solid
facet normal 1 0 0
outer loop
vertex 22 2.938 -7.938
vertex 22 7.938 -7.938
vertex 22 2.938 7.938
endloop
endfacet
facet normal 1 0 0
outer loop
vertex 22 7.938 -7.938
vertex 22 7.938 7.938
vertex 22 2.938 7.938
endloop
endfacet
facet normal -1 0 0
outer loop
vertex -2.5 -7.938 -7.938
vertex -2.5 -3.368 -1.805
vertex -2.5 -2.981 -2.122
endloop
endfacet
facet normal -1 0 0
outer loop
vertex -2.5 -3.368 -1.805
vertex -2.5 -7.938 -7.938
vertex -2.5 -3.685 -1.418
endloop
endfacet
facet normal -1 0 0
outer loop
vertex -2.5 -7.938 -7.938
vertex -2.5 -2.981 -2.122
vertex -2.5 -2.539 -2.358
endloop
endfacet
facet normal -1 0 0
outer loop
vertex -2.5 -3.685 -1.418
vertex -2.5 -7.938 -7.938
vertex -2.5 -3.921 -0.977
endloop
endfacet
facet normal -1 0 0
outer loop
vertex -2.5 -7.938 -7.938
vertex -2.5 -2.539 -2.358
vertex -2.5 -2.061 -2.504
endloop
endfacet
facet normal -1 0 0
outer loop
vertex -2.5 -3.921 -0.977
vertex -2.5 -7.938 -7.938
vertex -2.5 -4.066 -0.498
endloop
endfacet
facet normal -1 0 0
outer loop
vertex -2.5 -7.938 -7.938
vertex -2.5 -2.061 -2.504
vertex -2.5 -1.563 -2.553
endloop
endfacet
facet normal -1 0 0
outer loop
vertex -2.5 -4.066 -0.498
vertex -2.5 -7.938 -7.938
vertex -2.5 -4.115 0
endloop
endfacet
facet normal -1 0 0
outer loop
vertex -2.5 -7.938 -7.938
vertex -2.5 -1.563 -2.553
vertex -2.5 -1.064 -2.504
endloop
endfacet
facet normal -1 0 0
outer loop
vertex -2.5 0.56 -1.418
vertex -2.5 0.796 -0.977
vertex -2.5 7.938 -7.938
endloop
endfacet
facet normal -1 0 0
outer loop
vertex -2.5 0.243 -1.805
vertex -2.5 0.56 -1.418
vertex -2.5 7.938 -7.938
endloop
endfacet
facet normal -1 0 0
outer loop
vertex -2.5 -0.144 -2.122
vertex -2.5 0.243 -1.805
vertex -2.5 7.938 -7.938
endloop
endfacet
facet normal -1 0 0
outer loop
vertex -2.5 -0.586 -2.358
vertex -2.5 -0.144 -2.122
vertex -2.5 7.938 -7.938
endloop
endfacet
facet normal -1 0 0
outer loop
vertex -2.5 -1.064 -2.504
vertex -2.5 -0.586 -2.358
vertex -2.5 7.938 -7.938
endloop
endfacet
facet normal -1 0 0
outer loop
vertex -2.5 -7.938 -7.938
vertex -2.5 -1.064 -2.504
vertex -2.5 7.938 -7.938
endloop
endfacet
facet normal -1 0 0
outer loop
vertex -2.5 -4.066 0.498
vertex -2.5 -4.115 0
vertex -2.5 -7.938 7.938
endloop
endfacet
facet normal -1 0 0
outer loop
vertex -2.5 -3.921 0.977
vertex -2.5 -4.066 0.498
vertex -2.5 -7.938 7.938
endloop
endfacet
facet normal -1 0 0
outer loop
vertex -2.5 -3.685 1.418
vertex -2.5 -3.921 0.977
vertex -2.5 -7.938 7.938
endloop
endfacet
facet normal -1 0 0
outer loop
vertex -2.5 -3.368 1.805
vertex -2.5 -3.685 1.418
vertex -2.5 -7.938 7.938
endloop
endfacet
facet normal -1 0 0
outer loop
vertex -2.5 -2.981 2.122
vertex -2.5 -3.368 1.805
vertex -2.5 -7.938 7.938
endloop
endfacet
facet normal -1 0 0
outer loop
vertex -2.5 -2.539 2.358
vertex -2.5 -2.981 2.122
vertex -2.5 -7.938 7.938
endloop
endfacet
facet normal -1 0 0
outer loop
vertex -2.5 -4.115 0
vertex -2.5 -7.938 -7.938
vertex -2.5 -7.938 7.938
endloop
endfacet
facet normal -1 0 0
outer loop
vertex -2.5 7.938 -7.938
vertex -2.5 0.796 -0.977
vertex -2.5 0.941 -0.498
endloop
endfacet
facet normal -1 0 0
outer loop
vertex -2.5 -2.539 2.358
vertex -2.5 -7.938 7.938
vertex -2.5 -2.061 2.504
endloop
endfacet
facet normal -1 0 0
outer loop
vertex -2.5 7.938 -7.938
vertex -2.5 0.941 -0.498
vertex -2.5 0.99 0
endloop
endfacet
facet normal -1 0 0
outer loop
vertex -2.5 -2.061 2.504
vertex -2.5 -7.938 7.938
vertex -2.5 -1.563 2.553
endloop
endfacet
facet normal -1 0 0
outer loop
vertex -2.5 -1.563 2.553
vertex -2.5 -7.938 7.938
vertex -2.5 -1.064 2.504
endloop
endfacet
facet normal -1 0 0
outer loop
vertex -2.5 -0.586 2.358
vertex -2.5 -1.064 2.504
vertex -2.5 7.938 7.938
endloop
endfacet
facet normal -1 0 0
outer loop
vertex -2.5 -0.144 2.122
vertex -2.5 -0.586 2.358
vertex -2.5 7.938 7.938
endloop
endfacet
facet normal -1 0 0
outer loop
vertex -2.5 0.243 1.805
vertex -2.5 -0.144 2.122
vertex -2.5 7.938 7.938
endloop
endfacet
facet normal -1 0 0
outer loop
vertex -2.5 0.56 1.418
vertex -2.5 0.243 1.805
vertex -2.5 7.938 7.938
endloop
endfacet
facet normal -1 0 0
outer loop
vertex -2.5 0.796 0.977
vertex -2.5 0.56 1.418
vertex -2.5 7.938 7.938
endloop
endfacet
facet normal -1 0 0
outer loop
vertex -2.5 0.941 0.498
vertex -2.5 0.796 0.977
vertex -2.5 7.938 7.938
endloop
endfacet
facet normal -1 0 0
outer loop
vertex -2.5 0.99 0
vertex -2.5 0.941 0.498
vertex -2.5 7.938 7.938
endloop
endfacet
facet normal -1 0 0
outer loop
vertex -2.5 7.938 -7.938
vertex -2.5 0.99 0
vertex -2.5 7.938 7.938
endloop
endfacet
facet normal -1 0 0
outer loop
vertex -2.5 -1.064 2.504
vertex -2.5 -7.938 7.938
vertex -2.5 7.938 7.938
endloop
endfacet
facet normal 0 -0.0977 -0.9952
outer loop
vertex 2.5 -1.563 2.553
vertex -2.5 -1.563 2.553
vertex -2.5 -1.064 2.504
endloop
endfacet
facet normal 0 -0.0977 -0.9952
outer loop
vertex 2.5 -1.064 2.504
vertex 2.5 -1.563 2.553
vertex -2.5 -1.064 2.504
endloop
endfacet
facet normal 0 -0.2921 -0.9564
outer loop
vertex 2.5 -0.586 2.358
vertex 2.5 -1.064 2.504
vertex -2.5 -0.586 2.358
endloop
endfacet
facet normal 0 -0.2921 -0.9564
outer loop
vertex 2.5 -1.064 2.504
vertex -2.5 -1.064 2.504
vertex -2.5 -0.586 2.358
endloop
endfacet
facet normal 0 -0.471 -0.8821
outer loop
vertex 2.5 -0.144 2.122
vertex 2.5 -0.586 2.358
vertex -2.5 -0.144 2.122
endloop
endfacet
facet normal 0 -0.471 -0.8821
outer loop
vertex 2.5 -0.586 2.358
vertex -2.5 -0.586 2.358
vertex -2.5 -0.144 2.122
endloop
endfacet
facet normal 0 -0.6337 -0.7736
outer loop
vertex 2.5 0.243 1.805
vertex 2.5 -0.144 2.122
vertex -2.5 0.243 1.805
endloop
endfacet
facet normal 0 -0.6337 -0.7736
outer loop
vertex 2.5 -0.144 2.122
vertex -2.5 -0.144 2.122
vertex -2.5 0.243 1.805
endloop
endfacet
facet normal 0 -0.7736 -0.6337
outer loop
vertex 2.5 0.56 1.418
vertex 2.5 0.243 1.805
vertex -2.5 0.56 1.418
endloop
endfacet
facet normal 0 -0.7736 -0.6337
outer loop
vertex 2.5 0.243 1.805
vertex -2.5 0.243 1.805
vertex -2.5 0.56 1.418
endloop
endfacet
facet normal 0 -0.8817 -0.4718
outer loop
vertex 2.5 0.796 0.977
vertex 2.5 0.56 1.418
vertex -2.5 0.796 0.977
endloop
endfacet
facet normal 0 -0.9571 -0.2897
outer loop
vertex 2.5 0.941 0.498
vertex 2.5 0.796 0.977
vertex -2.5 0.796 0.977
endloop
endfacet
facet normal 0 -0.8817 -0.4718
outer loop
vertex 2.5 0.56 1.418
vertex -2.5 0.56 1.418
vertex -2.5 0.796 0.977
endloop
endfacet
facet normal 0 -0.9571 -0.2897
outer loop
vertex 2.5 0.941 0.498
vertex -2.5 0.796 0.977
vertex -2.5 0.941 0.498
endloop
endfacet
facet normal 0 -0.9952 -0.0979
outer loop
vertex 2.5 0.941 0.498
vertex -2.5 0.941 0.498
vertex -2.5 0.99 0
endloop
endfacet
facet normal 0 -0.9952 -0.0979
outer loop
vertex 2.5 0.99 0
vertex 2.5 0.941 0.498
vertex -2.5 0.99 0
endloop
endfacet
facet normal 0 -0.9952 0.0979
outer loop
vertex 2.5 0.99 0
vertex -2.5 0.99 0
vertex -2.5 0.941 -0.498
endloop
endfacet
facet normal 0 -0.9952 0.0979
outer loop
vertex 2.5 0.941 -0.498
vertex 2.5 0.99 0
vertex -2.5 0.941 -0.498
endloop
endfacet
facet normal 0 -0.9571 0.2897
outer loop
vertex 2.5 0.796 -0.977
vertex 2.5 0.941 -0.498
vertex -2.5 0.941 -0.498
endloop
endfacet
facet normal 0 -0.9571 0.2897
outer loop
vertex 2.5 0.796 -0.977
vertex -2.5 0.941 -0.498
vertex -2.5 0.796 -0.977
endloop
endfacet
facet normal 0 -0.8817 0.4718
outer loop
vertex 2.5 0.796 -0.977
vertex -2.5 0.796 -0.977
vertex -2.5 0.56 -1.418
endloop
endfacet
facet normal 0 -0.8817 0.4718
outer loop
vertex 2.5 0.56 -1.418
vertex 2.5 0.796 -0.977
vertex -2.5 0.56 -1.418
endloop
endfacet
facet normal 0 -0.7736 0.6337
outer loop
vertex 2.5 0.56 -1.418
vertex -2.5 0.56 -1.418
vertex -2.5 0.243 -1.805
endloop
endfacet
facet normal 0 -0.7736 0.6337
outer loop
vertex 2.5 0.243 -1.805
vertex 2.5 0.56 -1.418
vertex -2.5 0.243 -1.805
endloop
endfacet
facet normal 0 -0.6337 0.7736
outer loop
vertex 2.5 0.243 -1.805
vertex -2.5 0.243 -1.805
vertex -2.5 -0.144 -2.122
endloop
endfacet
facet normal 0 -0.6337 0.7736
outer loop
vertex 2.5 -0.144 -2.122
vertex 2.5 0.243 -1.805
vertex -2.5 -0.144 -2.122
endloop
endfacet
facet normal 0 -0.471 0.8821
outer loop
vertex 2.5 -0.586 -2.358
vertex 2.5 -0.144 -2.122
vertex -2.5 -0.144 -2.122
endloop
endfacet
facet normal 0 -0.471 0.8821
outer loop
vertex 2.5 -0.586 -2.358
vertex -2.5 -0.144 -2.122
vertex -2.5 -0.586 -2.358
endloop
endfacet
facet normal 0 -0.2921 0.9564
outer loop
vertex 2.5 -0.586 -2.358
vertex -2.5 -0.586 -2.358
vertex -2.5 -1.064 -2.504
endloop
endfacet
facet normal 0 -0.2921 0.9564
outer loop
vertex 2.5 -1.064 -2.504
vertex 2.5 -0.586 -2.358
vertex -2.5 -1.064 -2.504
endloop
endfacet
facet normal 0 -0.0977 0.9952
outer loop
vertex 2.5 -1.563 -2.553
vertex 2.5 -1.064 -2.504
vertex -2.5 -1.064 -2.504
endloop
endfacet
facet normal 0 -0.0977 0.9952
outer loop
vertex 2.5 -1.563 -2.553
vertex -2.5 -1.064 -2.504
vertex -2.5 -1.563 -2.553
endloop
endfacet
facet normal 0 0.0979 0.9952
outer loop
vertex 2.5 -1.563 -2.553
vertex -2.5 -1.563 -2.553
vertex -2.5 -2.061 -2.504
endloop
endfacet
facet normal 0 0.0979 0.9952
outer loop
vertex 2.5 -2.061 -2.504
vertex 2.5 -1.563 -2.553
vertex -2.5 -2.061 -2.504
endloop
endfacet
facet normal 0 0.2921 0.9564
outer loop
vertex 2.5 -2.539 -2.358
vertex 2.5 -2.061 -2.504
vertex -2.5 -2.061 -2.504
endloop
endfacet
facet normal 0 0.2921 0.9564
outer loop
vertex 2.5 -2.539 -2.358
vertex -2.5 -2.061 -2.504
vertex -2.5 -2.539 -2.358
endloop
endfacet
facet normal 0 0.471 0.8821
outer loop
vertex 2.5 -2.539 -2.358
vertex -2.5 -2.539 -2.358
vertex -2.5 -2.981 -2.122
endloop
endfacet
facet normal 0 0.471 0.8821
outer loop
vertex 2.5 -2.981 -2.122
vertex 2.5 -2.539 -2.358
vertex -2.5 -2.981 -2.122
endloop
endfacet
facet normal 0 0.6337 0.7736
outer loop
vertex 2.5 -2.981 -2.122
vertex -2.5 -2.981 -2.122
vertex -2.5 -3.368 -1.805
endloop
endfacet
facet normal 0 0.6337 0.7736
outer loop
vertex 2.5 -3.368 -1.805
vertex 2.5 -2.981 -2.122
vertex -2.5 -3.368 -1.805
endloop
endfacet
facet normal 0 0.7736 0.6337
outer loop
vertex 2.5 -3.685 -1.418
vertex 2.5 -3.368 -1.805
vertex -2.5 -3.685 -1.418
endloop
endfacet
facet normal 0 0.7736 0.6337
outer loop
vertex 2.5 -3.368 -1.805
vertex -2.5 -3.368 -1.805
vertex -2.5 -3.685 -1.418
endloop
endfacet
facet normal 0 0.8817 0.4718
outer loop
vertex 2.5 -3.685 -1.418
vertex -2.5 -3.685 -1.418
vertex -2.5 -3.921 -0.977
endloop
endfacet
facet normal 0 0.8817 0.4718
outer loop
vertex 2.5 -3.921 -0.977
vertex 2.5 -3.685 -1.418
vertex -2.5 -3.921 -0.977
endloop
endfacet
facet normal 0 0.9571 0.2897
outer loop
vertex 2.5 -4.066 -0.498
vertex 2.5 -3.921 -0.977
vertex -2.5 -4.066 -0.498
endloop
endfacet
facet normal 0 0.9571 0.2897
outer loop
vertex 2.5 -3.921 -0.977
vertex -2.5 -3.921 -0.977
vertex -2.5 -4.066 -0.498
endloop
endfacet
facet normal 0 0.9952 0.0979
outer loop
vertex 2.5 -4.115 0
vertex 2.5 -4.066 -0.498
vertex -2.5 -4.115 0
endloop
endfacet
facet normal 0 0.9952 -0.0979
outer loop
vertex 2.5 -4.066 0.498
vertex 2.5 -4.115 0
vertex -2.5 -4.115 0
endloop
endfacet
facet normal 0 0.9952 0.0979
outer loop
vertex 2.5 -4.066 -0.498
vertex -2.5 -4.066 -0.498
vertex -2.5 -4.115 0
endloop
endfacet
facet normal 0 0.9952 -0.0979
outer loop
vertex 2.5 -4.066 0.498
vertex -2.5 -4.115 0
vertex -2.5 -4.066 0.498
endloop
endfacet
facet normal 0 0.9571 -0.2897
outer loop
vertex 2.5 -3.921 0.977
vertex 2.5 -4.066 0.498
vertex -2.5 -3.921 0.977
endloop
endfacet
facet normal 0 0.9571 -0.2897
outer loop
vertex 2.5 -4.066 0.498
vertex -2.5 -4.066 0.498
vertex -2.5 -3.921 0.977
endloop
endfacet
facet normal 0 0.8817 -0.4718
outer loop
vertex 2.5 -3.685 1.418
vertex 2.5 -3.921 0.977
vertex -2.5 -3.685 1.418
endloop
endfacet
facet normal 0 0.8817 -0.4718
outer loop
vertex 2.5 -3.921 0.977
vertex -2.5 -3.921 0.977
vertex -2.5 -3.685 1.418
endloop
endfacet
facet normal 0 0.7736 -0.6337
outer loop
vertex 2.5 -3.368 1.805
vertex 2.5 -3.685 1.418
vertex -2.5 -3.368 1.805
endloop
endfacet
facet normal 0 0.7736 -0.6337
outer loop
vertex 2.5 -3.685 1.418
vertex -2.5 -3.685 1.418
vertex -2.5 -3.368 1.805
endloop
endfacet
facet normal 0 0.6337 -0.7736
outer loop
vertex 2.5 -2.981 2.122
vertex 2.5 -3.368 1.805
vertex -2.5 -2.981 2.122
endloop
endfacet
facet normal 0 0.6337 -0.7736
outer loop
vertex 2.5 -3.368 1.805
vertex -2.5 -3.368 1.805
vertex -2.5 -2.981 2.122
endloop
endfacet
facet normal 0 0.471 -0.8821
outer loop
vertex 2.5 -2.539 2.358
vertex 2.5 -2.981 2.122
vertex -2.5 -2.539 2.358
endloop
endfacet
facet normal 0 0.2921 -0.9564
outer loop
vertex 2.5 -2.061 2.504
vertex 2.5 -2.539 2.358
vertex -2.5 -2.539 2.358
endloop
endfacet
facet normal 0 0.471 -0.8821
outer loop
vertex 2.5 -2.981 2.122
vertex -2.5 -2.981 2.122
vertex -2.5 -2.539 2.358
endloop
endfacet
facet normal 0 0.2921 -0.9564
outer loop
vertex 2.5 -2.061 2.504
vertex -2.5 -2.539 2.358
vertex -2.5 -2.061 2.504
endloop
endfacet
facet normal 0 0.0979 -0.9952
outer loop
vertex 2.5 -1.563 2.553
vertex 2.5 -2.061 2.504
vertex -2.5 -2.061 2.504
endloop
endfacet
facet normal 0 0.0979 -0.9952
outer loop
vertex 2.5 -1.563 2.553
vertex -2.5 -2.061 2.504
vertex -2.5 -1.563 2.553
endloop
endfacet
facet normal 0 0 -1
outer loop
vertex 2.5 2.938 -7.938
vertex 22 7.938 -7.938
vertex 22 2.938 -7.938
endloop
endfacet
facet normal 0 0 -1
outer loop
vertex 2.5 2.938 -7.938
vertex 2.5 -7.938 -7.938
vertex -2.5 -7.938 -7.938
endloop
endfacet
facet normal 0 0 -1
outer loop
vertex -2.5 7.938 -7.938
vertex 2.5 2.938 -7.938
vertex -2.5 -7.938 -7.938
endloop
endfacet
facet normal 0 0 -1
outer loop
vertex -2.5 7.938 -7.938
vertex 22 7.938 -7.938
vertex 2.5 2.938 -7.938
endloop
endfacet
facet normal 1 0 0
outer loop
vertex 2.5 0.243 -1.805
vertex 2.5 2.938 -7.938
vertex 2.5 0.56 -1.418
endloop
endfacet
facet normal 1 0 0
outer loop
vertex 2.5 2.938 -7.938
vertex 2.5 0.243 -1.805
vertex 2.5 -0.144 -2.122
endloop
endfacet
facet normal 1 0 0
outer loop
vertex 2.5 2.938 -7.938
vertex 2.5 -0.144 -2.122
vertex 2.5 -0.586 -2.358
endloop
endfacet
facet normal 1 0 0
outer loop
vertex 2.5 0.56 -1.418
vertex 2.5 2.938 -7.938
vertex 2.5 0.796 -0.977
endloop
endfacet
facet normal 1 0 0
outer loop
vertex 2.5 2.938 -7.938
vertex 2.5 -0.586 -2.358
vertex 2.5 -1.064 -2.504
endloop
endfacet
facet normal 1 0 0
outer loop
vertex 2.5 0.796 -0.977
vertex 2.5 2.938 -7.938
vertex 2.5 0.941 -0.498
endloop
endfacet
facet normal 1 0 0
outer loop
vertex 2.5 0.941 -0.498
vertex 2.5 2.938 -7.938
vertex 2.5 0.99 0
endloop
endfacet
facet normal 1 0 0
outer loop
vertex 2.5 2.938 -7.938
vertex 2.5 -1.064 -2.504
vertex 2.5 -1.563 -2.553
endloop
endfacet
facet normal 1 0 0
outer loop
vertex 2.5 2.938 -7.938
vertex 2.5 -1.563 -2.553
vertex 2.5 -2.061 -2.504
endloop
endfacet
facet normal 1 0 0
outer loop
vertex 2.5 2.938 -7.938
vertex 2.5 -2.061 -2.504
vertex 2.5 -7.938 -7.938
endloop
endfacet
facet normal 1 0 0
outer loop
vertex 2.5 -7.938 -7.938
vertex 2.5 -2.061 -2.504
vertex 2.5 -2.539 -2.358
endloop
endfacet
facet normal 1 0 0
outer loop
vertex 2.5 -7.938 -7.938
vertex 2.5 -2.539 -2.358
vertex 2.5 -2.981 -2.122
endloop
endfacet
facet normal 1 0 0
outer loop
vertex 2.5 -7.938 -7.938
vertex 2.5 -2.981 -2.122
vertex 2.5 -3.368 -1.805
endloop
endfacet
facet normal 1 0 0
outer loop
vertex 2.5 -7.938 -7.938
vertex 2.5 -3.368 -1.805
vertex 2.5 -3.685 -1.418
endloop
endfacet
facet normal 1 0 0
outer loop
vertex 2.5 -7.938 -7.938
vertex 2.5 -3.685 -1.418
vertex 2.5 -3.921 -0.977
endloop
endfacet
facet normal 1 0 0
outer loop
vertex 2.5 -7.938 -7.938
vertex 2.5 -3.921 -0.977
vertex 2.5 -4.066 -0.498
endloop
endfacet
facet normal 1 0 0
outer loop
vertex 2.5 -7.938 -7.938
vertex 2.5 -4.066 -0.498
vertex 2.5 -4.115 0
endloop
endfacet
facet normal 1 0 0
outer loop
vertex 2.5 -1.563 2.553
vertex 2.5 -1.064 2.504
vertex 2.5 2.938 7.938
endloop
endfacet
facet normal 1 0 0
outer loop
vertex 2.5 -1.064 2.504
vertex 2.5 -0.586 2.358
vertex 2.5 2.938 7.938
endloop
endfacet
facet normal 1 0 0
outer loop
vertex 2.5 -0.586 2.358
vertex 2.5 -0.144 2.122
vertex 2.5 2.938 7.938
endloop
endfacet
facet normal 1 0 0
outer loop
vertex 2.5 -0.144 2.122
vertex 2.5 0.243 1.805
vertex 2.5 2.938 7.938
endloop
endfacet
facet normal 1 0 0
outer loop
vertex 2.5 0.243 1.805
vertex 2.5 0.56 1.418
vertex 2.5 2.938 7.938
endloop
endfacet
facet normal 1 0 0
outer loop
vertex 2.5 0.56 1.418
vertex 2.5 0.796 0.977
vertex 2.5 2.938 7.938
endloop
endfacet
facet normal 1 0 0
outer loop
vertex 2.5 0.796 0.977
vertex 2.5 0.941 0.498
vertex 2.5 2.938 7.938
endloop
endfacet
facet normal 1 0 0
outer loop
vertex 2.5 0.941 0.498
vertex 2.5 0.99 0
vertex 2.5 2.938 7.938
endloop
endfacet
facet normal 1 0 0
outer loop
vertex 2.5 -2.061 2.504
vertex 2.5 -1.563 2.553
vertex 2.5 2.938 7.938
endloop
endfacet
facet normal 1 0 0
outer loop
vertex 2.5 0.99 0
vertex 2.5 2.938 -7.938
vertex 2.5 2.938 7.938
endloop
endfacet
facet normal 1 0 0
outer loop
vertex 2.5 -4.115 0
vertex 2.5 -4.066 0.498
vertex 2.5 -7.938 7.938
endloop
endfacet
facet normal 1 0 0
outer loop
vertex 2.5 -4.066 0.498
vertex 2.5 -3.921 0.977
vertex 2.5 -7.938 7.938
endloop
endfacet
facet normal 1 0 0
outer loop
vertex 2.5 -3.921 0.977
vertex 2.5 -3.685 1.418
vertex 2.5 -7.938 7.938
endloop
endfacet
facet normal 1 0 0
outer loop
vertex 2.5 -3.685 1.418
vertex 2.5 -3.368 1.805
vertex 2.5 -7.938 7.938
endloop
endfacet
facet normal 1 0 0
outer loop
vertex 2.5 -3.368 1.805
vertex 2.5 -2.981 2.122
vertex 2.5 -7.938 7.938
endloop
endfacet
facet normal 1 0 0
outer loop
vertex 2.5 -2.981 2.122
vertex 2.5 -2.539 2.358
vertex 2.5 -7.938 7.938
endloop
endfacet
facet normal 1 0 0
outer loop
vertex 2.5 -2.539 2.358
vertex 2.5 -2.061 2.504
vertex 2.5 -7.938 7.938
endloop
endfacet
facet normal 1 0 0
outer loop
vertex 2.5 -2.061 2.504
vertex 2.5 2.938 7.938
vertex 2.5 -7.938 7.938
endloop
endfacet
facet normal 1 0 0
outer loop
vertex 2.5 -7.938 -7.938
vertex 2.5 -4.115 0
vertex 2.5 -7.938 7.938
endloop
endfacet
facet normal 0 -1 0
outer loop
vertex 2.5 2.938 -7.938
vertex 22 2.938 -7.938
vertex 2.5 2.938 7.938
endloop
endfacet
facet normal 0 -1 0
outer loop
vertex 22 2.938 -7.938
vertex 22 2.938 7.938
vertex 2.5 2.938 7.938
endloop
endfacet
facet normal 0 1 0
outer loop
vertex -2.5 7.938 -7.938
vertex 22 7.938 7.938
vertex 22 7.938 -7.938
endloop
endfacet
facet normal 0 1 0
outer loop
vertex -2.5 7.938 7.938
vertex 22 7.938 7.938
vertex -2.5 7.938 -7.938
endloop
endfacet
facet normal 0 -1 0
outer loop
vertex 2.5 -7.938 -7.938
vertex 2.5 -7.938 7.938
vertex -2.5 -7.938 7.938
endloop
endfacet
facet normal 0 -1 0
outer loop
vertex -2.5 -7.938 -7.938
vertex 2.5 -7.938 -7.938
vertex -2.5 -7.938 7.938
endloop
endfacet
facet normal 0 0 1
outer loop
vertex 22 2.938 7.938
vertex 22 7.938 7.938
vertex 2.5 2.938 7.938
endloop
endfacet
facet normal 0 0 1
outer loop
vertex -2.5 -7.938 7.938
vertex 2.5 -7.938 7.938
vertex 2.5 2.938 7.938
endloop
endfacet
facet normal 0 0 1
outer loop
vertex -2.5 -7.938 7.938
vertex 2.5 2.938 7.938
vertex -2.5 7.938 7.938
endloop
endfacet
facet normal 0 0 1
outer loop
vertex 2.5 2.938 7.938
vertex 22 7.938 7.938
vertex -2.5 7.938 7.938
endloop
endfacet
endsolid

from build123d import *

# Parameters (mm, degrees)
BOSS_EXTRUDE1_DEPTH    = 7.9375
F_10_CLEARANCE_HOLE1_D = 5.1054


with BuildPart() as part:
    # Sketch2 → Boss-Extrude1 (new, symmetric)
    with BuildSketch(Plane.XY):
        Polygon((-2.5, 7.9375), (2.5, 7.9375), (22, 7.9375), (22, 2.9375), (2.5, 2.9375), (2.5, -7.9375), (-2.5, -7.9375), align=None)
    extrude(amount=BOSS_EXTRUDE1_DEPTH, both=True)

    # #10 Clearance Hole1 (through all)
    with Locations(Plane(origin=(2.5, 0, 0), x_dir=(0, 0, -1), z_dir=(1, 0, 0))):
        with Locations((0, -1.5625)):
            Hole(F_10_CLEARANCE_HOLE1_D / 2)


solid = part.part
